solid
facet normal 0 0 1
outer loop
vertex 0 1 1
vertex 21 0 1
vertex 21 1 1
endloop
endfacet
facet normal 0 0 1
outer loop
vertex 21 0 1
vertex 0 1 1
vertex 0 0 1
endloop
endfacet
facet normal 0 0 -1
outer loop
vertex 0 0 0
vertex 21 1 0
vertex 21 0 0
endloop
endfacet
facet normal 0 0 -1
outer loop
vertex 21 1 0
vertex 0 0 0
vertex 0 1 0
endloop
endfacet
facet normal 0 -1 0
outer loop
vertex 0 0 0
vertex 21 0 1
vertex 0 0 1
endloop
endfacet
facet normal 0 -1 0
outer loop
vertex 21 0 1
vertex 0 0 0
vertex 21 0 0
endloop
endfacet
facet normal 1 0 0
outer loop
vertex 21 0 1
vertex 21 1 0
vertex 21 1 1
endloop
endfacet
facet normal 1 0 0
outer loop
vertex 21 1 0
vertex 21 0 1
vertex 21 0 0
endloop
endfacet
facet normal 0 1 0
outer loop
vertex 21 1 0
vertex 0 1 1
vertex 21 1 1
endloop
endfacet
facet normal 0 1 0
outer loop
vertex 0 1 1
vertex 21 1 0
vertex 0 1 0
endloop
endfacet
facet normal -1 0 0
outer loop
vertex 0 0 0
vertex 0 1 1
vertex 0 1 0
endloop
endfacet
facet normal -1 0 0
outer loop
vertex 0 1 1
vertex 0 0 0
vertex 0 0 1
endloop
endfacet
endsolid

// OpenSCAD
// file: goews.scad
goews_fundamental_unit = 42;
goews_staggered_x_spacing = goews_fundamental_unit / 2;
module holder() cube([goews_staggered_x_spacing, 1, 1]);
// main file
include <goews.scad>
wall_thickness = 6;
tine_count = 2;
cleat_spacing_x = goews_staggered_x_spacing;
/* [Hidden] */
cleat_stagger = true;

holder();
